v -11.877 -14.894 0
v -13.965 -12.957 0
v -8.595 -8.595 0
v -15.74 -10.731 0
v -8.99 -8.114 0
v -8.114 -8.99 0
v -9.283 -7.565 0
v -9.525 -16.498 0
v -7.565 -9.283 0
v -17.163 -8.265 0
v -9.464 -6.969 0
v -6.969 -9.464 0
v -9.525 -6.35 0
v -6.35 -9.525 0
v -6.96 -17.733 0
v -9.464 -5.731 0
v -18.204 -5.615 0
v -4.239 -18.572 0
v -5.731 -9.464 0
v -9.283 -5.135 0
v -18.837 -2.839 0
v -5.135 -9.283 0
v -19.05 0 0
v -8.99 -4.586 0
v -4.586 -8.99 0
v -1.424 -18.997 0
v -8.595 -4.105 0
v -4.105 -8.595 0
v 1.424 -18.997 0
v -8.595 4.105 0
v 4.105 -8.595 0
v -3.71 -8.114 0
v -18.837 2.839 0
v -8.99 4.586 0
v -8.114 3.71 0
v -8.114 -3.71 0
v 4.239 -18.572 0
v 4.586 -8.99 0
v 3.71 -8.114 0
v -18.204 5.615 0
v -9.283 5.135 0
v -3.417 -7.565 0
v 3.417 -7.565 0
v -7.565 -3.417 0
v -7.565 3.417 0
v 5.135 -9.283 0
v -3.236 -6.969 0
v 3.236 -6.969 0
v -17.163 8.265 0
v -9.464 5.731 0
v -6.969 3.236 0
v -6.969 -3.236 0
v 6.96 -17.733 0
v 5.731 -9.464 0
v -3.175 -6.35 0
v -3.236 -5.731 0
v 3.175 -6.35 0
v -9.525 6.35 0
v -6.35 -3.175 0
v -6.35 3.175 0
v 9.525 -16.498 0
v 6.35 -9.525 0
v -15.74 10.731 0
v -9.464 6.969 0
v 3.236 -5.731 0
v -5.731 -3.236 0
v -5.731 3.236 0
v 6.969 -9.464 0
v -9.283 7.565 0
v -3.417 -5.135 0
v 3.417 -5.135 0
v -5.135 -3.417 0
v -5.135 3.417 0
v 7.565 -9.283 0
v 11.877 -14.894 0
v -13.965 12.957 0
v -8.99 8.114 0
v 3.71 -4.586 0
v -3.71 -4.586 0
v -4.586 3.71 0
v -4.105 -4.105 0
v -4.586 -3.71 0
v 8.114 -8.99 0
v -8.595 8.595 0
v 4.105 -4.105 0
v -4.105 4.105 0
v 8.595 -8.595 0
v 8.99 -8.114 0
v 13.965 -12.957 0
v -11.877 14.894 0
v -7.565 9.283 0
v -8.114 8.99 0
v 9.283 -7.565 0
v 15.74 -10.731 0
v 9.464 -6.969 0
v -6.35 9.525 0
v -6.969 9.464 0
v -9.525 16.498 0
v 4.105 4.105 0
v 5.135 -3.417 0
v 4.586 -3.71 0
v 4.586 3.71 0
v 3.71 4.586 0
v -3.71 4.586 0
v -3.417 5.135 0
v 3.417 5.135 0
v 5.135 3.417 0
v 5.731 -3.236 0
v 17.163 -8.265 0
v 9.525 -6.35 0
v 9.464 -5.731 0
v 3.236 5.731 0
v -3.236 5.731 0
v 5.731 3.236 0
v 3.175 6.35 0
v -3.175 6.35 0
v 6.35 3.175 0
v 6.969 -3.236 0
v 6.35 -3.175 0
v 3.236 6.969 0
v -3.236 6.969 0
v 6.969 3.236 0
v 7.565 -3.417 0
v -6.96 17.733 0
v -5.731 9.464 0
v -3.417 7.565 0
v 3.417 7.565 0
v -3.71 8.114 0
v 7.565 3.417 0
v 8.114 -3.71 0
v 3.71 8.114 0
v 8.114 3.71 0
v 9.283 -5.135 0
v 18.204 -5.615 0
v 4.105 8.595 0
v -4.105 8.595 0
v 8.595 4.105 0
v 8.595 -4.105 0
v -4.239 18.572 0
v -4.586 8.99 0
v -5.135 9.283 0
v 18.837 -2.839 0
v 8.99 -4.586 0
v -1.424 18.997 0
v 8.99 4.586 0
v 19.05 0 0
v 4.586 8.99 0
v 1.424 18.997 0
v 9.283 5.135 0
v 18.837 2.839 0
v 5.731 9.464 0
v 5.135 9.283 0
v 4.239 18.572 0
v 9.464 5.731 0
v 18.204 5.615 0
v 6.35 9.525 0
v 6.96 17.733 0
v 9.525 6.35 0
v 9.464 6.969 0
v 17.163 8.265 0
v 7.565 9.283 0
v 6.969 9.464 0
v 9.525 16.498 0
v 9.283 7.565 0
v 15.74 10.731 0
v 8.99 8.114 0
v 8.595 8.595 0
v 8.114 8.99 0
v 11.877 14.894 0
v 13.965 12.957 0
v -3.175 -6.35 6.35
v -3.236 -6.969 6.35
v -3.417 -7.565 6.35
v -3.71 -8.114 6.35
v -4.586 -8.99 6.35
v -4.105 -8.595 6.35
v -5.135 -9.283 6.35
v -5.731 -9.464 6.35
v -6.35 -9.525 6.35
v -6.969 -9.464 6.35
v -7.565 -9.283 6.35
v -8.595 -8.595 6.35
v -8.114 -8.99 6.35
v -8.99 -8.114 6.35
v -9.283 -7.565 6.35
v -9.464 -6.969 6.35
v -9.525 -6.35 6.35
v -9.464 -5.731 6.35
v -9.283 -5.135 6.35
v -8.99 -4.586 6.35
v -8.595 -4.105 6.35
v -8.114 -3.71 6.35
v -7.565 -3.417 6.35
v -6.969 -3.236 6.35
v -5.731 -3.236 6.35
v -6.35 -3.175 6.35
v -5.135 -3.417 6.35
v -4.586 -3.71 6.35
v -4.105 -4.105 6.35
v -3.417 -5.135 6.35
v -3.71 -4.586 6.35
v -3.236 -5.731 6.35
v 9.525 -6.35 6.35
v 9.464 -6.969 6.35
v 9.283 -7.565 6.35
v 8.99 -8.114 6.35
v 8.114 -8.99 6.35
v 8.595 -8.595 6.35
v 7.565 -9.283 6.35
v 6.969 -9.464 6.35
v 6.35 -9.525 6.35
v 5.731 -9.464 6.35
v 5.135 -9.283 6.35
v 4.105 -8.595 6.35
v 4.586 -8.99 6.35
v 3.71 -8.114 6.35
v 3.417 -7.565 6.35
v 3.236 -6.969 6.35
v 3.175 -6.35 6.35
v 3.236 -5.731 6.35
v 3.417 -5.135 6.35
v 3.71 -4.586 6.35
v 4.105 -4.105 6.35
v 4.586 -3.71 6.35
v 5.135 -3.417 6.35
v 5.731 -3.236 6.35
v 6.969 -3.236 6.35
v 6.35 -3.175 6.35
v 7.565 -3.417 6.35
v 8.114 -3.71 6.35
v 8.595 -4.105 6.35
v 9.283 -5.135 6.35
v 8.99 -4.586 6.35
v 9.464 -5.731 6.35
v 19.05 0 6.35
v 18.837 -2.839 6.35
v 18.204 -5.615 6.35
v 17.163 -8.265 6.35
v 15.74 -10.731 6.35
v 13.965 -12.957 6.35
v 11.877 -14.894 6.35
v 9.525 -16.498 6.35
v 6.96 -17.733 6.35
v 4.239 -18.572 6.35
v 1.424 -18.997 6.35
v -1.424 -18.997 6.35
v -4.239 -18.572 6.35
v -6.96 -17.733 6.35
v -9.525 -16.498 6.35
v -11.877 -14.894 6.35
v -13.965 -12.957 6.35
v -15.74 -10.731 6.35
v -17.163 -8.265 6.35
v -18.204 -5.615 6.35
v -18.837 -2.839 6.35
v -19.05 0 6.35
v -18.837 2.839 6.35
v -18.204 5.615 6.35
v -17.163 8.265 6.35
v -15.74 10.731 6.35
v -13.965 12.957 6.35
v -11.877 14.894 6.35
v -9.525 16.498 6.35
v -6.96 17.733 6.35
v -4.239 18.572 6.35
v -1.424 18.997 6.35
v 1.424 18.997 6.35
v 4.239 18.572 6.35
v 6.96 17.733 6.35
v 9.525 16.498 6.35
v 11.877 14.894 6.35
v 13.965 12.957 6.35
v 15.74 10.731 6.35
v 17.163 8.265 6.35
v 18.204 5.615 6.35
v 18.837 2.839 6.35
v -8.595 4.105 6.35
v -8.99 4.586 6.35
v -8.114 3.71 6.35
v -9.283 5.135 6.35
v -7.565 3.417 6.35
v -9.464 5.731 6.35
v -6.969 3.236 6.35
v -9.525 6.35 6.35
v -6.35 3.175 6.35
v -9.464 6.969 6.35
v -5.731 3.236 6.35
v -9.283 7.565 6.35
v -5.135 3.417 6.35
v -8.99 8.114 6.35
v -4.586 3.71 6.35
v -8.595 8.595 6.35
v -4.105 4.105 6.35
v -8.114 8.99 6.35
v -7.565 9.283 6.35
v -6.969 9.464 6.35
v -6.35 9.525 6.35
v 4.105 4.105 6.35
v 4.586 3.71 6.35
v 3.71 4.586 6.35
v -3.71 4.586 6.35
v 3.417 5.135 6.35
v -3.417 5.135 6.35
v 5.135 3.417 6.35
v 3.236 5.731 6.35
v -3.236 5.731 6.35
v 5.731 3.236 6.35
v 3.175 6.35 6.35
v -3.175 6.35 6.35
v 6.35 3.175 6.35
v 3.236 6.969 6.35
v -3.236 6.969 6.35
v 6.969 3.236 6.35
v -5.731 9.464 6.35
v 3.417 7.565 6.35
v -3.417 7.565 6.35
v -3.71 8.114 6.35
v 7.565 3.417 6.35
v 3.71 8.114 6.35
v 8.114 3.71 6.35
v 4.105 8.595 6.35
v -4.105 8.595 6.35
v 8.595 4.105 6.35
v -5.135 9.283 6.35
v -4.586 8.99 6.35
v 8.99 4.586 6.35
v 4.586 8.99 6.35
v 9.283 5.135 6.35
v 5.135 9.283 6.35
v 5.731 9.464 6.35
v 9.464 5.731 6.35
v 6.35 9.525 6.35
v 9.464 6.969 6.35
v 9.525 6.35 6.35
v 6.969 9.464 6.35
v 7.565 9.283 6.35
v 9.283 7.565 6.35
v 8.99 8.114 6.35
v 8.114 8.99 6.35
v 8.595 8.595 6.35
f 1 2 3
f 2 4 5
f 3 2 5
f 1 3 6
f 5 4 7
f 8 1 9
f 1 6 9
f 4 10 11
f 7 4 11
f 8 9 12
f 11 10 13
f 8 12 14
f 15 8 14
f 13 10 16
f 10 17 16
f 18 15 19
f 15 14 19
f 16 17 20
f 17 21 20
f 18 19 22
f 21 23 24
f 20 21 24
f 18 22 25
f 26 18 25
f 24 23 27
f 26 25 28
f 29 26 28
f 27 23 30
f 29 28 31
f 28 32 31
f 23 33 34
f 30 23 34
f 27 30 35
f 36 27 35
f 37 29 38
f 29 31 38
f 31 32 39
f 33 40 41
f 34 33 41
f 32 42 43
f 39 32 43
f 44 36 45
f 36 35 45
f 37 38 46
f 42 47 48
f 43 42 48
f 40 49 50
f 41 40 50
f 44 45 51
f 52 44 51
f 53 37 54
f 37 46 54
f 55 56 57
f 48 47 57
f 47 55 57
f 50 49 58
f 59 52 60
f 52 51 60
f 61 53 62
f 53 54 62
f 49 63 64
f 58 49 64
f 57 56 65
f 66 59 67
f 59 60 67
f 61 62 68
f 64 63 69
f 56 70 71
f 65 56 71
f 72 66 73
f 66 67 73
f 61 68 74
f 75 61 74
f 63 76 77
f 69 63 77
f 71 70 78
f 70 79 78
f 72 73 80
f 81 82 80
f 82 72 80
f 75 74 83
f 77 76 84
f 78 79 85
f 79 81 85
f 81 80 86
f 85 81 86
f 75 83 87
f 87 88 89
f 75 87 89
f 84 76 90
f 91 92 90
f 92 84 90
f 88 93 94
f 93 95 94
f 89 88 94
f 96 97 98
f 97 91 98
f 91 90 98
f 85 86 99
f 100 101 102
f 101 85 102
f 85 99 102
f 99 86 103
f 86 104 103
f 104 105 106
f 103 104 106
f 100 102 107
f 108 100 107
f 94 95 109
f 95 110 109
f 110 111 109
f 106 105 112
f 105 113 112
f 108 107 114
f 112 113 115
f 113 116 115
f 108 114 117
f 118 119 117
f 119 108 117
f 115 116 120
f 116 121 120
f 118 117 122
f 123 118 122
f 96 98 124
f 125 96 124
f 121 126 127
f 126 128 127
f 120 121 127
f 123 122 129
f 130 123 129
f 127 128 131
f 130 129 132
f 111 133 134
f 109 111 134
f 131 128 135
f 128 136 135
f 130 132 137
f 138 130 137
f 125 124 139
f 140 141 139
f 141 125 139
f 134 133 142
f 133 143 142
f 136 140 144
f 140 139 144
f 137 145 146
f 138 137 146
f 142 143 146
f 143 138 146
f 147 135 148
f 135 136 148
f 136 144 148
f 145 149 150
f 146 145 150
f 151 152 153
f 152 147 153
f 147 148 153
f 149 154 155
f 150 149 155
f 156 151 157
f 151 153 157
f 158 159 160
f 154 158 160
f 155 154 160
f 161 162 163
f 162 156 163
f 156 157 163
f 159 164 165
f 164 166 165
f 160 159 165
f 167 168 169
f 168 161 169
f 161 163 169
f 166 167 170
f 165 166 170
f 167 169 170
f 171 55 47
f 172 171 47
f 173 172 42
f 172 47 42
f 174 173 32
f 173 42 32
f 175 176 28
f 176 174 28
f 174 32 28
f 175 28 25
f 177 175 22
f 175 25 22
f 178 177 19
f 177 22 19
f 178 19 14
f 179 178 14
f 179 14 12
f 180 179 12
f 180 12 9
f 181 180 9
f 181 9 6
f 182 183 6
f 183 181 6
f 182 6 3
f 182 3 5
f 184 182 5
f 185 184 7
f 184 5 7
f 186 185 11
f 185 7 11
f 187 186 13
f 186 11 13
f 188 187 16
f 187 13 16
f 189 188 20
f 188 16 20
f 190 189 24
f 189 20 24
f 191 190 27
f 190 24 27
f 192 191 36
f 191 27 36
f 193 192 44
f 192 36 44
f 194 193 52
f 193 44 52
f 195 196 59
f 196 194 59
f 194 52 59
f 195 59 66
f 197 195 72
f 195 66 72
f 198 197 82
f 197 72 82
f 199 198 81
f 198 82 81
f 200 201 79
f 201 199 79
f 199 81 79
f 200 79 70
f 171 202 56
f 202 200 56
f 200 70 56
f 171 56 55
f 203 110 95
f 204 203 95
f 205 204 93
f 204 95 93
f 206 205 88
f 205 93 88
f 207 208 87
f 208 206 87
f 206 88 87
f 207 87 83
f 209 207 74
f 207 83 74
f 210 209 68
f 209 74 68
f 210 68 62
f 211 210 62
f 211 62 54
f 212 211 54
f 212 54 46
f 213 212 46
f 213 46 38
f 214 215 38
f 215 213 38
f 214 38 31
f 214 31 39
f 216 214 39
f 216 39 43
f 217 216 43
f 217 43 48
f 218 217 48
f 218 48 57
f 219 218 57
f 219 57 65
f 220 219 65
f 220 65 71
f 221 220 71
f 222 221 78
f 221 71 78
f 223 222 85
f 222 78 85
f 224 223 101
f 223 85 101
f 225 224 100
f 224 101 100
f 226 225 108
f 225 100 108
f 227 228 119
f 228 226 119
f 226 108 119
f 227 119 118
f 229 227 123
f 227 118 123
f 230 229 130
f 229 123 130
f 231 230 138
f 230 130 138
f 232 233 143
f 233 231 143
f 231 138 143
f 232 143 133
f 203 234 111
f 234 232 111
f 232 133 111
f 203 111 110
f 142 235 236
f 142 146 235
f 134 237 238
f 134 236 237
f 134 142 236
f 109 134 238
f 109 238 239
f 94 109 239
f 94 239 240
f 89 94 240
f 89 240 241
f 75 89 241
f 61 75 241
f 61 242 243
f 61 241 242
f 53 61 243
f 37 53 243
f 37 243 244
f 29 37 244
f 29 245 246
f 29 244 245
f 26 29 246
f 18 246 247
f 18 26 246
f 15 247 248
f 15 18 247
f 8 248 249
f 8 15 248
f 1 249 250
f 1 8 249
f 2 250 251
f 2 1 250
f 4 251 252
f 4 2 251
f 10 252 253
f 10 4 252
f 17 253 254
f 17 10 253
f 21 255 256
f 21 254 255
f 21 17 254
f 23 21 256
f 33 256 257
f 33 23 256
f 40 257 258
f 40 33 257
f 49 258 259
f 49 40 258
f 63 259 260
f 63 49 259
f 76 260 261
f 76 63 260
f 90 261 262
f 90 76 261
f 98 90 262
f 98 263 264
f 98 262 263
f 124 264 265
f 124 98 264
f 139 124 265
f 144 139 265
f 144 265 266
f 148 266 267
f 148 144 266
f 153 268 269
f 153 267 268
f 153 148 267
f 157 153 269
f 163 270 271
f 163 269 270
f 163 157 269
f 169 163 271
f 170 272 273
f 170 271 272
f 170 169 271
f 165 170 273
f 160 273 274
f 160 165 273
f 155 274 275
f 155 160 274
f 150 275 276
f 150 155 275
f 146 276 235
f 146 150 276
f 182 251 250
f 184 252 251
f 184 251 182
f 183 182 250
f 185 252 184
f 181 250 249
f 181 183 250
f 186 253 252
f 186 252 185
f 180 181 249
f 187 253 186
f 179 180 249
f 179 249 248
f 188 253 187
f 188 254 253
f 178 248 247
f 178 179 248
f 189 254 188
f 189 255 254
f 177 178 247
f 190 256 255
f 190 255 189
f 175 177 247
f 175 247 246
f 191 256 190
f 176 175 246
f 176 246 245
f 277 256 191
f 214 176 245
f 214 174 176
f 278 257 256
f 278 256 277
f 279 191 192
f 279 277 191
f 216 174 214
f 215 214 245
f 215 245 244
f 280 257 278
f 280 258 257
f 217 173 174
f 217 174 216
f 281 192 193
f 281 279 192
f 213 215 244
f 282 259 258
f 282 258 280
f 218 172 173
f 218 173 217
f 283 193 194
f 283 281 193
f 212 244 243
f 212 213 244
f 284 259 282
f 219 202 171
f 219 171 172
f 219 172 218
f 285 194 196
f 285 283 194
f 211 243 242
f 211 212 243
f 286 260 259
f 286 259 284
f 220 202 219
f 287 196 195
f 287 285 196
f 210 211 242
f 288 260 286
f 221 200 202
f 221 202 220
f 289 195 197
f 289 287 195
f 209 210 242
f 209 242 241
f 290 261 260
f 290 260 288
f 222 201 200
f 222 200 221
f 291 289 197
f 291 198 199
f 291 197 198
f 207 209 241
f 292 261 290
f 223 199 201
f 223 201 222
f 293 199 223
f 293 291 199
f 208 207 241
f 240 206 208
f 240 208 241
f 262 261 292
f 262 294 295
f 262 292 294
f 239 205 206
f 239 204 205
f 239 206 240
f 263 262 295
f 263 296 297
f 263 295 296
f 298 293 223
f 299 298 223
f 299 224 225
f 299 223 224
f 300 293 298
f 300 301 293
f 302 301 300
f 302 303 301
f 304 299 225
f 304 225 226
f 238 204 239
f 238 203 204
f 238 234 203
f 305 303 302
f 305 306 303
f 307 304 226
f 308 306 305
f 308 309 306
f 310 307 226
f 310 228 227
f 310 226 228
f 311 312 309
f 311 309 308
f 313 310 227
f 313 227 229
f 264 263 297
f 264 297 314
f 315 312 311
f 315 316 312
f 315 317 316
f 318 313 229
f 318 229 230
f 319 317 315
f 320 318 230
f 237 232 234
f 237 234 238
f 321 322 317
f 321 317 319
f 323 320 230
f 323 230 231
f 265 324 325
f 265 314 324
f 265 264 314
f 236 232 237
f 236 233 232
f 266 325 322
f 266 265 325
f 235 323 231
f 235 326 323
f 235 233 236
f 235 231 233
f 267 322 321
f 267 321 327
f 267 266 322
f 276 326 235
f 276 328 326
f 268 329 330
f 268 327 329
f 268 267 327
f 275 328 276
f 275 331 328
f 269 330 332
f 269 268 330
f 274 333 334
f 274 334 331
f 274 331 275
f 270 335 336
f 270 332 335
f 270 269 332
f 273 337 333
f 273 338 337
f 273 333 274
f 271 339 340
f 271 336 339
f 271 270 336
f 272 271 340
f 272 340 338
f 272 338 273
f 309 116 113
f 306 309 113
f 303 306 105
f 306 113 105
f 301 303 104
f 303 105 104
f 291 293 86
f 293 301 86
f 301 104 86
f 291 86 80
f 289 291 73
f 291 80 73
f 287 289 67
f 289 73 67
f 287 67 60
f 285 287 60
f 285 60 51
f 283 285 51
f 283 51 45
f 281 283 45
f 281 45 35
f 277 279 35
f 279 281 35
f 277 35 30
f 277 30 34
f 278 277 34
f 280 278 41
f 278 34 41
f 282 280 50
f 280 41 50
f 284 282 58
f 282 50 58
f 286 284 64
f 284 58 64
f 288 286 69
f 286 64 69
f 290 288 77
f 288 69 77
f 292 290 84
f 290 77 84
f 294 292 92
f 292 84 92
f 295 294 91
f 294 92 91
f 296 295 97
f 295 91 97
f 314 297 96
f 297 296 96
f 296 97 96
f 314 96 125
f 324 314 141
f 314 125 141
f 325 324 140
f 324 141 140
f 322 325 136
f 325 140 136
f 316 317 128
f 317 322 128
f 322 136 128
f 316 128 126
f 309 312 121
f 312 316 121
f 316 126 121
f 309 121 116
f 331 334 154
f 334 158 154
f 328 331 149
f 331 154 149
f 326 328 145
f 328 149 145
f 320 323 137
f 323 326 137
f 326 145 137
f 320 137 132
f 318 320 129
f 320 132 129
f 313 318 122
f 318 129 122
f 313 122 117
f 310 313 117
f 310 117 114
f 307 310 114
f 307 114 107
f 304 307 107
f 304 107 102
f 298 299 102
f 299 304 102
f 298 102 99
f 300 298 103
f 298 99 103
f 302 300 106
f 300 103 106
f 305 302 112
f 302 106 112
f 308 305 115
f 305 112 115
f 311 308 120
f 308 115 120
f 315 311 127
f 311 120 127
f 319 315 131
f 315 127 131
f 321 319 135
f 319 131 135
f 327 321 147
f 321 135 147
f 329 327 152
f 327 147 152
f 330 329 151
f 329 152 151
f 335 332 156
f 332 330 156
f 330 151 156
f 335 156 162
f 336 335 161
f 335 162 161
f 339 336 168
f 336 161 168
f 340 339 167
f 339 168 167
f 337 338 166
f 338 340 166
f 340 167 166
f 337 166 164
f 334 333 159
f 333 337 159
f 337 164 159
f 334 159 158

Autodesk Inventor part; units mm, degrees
ref_plane "YZ Plane" through (0, 0, 0) normal (1, 0, 0) x (0, 1, 0)
ref_plane "XZ Plane" through (0, 0, 0) normal (0, 1, 0) x (-1, 0, 0)
ref_plane "XY Plane" through (0, 0, 0) normal (0, 0, 1) x (1, 0, 0)
sketch "Sketch1" plane through (0, 0, 0) normal (0, 0, 1) x (1, 0, 0)
  circle A0 centre (0, 0) radius 19.05
  circle A1 centre (6.35, 6.35) radius 3.175
  circle A2 centre (-6.35, 6.35) radius 3.175
  circle A3 centre (-6.35, -6.35) radius 3.175
  circle A4 centre (6.35, -6.35) radius 3.175
  line L0 (0, 0) -> (0, 38.1233) construction
  line L1 (0, 0) -> (30.2858, 0) construction
  dimension "d0" = 38.1
  dimension "d1" = 6.35
  dimension "d4" = 360
  dimension "d6" = 6.35
  dimension "d7" = 6.35
extrude "Extrusion1" add sketch "Sketch1" along normal blind 6.35
properties part number "ShoulderBracketXZPlate"
